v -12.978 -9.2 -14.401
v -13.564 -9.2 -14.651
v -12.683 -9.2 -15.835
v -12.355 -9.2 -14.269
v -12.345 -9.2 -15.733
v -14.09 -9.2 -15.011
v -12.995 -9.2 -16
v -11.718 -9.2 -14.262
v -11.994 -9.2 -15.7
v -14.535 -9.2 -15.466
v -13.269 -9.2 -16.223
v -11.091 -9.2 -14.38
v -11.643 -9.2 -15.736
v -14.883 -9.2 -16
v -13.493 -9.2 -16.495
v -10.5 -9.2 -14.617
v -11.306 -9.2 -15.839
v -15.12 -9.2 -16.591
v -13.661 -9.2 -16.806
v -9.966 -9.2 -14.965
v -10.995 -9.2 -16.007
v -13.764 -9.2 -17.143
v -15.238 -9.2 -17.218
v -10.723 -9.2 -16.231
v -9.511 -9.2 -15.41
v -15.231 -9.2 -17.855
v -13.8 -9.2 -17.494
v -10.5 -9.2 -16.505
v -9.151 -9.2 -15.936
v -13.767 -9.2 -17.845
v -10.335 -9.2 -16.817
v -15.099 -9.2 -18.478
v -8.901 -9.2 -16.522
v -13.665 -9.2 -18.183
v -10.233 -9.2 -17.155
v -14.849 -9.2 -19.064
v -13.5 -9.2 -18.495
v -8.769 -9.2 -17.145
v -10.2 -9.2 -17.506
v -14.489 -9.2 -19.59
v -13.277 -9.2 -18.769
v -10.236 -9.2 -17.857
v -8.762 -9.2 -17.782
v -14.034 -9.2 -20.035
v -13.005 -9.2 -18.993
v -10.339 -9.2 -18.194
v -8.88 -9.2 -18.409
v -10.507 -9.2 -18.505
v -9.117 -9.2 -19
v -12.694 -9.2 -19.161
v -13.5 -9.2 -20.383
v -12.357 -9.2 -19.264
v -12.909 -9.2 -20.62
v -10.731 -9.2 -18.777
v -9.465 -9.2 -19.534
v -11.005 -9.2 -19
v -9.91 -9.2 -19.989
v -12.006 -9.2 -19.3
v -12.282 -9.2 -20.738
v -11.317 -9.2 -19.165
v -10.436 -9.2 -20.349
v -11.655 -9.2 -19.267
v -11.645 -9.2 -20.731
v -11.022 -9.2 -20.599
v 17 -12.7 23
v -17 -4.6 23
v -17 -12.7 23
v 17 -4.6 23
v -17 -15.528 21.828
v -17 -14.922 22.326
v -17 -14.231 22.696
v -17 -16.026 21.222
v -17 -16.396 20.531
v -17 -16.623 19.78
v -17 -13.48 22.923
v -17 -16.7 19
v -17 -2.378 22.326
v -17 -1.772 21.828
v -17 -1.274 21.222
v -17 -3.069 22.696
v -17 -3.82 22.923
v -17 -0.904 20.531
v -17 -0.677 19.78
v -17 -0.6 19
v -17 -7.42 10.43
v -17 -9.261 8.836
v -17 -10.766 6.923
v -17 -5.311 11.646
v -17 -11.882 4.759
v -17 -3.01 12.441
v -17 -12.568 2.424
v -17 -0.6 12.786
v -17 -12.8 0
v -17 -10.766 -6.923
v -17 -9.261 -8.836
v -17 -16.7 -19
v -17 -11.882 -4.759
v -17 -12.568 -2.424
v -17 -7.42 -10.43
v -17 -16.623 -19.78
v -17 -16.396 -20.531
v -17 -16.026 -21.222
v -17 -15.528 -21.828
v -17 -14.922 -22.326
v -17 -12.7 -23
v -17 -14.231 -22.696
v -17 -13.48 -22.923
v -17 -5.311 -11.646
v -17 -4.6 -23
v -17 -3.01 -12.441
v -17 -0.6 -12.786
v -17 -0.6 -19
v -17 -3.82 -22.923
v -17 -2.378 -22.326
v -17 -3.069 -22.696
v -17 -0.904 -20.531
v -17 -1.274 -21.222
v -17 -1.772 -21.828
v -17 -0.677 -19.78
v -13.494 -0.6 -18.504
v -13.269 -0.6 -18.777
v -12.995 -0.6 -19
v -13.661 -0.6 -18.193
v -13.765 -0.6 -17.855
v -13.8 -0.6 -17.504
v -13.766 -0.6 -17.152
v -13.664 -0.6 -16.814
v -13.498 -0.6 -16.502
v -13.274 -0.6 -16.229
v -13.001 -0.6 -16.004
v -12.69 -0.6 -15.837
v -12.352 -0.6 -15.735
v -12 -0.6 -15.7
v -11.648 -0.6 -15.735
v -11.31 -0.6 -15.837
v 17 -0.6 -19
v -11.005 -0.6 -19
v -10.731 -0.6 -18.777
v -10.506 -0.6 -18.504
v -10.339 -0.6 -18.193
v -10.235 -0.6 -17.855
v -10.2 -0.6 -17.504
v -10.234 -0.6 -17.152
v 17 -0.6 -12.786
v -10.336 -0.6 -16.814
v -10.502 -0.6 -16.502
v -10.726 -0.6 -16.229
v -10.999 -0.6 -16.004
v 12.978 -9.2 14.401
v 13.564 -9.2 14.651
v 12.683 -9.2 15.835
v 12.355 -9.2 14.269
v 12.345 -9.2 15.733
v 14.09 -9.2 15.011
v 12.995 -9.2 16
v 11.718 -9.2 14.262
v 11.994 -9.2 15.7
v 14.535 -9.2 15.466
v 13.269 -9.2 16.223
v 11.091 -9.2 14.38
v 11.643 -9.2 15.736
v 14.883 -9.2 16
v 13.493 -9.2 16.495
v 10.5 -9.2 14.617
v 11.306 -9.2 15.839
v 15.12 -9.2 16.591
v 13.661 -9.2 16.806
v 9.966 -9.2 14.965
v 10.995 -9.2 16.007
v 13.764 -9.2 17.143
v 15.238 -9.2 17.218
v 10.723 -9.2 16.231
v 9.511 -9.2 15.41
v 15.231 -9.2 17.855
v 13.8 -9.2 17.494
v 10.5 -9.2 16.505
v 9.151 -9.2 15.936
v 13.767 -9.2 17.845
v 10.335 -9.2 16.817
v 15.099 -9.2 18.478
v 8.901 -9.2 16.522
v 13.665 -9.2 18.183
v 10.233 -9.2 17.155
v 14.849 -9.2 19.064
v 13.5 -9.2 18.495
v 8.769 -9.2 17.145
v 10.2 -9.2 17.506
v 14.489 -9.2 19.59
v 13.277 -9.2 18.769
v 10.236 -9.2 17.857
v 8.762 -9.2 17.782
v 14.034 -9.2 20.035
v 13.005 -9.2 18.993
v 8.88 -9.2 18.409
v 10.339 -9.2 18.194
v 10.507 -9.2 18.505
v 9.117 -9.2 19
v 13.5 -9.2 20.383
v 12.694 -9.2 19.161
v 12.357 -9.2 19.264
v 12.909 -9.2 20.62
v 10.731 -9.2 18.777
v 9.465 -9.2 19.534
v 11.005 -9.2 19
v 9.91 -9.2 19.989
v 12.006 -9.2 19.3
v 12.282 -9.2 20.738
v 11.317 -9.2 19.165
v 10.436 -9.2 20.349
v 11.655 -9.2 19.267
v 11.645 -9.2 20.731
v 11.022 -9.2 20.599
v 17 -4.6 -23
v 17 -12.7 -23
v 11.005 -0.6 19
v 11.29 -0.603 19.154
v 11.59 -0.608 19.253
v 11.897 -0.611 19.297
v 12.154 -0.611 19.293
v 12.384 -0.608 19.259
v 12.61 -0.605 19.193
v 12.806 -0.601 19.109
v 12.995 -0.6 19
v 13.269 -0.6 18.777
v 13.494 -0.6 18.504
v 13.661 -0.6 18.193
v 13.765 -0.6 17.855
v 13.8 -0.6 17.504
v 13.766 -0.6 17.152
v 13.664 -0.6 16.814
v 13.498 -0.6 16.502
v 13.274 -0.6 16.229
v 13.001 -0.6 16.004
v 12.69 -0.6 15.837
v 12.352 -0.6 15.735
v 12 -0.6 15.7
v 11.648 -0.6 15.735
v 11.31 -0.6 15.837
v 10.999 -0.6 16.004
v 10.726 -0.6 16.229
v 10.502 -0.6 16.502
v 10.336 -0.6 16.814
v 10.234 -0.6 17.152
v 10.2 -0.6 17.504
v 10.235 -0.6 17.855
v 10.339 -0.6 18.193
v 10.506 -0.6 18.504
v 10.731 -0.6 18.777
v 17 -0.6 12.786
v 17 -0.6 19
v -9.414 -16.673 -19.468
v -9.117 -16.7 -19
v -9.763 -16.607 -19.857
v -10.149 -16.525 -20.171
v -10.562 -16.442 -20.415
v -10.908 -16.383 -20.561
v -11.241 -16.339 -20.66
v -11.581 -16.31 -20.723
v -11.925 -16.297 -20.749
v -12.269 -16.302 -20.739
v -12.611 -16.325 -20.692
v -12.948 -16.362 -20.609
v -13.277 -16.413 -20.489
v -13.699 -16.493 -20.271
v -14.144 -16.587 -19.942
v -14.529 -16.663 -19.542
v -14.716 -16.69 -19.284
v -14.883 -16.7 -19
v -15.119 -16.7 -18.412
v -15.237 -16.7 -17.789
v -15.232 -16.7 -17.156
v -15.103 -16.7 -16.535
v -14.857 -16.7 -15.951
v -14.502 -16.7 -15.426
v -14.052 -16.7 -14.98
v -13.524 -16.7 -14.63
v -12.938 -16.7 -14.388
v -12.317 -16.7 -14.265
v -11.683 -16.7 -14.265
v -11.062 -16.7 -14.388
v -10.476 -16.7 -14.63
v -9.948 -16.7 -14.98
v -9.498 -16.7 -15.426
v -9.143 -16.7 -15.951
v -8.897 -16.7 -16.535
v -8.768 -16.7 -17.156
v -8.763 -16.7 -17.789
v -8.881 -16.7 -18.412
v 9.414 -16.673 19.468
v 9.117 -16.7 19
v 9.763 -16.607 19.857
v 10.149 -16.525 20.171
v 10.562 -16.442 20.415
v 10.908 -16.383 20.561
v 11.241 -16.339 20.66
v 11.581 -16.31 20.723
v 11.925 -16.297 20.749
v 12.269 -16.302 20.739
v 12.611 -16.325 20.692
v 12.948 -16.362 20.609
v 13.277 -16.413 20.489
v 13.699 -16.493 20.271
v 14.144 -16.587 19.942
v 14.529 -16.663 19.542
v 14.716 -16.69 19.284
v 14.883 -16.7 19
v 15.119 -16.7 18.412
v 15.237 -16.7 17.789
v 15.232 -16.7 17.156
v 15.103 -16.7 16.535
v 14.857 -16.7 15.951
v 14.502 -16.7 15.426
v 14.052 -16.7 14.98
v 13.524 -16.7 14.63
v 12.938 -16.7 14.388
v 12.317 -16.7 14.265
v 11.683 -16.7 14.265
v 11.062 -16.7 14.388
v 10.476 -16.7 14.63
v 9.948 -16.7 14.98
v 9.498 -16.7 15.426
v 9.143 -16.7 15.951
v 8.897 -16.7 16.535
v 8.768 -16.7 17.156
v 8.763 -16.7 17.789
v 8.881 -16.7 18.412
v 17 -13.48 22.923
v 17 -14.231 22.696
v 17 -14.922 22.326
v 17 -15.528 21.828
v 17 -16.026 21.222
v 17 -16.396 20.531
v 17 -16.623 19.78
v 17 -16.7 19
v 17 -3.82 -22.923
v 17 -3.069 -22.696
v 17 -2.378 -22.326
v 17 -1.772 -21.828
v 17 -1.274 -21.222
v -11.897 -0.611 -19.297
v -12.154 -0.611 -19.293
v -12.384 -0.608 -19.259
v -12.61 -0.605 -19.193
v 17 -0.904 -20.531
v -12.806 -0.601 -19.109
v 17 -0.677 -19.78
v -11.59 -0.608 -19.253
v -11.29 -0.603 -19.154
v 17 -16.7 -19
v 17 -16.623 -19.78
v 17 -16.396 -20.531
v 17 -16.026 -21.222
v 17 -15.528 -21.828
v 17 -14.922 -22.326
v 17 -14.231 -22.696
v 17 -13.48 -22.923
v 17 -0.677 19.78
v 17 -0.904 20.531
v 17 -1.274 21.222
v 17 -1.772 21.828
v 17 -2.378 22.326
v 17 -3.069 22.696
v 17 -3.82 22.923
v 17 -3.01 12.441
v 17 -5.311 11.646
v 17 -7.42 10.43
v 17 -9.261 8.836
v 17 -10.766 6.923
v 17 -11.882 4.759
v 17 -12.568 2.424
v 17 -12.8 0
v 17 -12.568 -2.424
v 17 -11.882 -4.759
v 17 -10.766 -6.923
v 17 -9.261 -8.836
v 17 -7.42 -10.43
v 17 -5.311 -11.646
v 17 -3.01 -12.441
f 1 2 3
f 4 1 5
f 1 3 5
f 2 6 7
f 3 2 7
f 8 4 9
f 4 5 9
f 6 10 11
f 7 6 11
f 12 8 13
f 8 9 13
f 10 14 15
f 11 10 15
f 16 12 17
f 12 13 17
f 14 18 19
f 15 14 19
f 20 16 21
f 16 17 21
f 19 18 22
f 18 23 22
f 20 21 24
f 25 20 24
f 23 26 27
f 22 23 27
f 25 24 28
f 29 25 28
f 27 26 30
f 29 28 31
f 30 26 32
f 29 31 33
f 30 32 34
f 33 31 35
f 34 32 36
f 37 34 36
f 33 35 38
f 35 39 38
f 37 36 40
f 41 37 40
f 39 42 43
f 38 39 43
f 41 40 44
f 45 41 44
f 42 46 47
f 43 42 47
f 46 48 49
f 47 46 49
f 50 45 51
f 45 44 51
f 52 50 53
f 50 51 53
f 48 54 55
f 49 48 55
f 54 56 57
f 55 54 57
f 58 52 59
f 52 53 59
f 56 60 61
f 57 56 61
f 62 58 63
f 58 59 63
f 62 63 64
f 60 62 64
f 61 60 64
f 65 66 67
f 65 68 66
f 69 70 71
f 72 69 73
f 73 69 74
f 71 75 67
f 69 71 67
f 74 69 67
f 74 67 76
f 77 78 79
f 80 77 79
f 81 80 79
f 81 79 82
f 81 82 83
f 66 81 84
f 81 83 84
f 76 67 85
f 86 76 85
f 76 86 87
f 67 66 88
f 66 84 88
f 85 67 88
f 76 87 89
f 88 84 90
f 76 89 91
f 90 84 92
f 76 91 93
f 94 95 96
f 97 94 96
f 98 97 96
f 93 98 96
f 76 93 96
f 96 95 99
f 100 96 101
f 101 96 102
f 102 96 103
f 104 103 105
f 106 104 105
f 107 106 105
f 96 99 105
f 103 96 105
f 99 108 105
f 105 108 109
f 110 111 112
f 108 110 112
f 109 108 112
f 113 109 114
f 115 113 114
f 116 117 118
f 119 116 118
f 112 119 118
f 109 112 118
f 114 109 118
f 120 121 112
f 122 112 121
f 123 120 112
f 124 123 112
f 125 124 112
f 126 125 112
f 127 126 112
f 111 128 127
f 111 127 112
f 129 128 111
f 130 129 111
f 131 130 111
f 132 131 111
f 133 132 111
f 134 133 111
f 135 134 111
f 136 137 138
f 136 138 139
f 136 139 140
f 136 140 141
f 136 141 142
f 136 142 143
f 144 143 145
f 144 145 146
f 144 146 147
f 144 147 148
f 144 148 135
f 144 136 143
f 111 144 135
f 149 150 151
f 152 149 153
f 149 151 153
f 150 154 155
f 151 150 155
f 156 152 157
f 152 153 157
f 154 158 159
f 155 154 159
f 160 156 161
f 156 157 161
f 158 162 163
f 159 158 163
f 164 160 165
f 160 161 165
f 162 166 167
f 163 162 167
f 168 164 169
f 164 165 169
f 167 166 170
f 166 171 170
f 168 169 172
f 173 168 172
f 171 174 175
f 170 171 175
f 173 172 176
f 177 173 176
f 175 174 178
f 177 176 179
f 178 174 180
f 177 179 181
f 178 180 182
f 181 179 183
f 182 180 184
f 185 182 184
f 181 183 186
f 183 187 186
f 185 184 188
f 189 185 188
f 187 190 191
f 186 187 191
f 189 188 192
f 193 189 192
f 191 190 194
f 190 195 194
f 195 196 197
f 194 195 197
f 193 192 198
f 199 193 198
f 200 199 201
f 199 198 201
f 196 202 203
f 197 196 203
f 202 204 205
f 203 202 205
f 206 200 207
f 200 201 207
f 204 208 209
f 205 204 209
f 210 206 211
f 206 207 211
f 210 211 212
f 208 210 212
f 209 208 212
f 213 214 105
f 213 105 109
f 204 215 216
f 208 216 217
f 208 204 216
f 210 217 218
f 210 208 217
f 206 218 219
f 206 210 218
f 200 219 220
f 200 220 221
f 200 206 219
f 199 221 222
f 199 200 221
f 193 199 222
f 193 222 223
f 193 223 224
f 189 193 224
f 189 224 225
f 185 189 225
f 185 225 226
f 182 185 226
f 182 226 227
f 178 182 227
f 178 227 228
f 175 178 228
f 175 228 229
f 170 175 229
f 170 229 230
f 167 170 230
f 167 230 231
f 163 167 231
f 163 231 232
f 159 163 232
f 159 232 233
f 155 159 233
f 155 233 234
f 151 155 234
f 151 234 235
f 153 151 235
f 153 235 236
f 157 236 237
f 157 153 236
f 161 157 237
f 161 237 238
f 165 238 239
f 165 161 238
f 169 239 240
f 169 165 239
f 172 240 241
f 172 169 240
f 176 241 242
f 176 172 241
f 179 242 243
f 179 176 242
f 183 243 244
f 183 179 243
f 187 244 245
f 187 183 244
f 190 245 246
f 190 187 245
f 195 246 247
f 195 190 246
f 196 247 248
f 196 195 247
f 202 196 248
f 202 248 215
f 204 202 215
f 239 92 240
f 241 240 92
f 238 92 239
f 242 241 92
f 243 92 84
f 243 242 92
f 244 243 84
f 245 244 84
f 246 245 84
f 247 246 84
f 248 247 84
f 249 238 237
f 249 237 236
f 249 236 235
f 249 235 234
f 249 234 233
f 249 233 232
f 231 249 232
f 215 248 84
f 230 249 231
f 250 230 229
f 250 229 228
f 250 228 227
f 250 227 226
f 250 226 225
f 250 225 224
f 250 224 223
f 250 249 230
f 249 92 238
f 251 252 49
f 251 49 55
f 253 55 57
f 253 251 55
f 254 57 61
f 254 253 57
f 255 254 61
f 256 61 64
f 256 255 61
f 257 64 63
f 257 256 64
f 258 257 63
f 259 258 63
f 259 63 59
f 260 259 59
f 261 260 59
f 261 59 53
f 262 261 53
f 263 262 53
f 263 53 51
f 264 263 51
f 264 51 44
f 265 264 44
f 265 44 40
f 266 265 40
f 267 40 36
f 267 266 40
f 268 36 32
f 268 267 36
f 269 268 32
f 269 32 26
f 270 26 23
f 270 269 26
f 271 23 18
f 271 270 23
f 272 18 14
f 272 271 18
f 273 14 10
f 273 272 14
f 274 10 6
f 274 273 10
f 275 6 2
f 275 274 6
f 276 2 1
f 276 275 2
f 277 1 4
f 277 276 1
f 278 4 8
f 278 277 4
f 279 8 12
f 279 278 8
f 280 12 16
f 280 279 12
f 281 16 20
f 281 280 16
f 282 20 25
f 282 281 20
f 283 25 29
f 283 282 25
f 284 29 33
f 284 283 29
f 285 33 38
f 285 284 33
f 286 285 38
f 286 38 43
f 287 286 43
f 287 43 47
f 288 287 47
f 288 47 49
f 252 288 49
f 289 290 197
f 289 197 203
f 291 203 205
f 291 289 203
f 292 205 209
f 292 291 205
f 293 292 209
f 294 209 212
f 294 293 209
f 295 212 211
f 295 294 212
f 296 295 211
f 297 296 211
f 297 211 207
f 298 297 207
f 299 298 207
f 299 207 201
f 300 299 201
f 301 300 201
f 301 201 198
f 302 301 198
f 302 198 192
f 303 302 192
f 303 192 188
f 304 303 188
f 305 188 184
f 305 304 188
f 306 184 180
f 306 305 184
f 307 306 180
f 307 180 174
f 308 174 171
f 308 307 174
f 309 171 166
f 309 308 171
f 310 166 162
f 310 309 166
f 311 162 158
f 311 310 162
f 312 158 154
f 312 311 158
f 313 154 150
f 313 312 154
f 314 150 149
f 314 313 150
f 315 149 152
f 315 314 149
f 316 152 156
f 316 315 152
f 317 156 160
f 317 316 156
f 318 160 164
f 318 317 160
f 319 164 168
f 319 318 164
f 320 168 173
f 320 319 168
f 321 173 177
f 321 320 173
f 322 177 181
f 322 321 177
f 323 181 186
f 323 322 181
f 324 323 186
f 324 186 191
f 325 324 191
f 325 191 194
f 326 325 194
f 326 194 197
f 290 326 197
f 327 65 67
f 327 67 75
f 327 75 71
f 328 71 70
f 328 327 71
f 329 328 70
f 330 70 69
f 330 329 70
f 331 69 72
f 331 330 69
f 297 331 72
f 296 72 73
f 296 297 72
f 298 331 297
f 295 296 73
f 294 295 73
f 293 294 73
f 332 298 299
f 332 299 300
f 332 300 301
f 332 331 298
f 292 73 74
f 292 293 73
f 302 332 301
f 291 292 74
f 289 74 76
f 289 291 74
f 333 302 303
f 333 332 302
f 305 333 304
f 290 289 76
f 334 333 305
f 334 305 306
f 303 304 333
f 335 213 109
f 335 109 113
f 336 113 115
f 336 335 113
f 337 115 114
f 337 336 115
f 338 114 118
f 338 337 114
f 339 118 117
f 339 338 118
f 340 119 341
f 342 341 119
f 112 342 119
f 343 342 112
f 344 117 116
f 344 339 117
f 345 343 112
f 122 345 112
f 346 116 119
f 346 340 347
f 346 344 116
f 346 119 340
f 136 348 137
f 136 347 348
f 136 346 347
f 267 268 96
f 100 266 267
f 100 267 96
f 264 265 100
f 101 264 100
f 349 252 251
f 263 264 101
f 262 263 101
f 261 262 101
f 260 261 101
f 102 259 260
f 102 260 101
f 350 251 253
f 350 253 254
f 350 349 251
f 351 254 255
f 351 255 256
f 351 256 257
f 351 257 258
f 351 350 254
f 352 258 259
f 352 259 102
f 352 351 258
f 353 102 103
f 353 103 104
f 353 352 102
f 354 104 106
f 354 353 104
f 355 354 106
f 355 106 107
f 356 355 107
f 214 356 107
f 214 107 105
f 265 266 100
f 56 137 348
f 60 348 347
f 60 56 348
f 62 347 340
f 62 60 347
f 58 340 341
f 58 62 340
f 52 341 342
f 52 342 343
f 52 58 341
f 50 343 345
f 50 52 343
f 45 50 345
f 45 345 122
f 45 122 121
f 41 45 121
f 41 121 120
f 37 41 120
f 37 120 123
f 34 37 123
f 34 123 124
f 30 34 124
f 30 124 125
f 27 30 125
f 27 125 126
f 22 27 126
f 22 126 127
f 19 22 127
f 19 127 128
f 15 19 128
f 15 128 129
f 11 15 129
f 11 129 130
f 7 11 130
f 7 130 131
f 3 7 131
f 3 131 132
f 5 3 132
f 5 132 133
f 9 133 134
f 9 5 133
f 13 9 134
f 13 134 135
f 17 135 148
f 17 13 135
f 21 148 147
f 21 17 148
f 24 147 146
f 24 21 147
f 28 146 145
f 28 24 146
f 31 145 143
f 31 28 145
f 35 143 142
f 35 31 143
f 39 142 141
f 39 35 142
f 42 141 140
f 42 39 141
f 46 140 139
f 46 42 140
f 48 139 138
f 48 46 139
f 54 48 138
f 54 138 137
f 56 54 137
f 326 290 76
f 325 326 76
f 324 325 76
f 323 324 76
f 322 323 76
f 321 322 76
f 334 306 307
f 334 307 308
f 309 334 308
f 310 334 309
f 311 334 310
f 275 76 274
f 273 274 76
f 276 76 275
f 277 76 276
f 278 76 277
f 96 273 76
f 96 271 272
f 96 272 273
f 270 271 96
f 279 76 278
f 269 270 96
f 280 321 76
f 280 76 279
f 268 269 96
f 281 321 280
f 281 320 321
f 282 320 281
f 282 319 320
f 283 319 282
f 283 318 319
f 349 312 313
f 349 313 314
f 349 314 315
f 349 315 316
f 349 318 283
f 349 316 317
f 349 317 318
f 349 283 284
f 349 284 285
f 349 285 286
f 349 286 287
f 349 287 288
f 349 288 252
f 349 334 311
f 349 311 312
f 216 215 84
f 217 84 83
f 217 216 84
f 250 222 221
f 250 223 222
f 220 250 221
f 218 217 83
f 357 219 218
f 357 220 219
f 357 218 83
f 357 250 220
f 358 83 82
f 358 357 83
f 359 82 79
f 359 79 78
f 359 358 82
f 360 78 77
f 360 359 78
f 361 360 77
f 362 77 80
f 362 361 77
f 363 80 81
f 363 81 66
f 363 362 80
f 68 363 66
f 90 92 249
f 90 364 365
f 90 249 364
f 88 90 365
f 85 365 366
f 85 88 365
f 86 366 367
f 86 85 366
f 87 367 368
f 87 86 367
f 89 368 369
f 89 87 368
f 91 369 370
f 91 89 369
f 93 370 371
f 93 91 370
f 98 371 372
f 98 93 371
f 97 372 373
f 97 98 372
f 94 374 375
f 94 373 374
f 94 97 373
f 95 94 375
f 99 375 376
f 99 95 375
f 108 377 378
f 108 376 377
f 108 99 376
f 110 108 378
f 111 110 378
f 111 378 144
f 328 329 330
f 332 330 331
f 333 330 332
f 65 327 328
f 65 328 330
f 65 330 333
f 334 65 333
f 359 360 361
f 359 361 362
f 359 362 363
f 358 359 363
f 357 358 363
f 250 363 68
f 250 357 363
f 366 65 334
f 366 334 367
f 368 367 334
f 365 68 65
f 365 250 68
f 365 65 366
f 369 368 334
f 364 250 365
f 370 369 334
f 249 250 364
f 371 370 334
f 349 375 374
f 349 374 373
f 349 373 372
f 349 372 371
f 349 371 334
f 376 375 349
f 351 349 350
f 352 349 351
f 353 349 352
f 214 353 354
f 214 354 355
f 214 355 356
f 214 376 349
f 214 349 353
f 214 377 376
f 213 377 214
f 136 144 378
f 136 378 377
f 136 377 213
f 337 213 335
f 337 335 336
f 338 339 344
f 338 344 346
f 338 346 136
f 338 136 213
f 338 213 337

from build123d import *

# Parameters (mm, degrees)
BOSS_EXTRUDE1_DEPTH     = 17
CUT_EXTRUDE1_DEPTH      = 34.119329703
CUT_EXTRUDE1_DEPTH_BACK = 34.119329703
SKETCH2_R               = 12.8
SKETCH3_R               = 1.8
CUT_EXTRUDE2_DEPTH      = 17
SKETCH4_R               = 3.25
CUT_EXTRUDE3_DEPTH      = 7.5


with BuildPart() as part:
    # Sketch1 → Boss-Extrude1 (new, symmetric)
    with BuildSketch(Plane(origin=(0, 0, 0), x_dir=(0, 0, -1), z_dir=(1, 0, 0))):
        with BuildLine():
            Line((-19, -16.7), (19, -16.7))
            ThreePointArc((19, -16.7), (21.828427125, -15.528427125), (23, -12.7))
            Line((23, -12.7), (23, -4.6))
            ThreePointArc((23, -4.6), (21.828427125, -1.771572875), (19, -0.6))
            Line((19, -0.6), (-19, -0.6))
            ThreePointArc((-19, -0.6), (-21.828427125, -1.771572875), (-23, -4.6))
            Line((-23, -4.6), (-23, -12.7))
            ThreePointArc((-23, -12.7), (-21.828427125, -15.528427125), (-19, -16.7))
        make_face()
    extrude(amount=BOSS_EXTRUDE1_DEPTH, both=True)

    # Sketch2 → Cut-Extrude1 (cut, two sides: drawn at the far end of the back side and taken through both)
    with BuildSketch(Plane(origin=(0, 0, 0), x_dir=(0, 0, -1), z_dir=(1, 0, 0)).offset(-CUT_EXTRUDE1_DEPTH_BACK)):
        Circle(SKETCH2_R)
    extrude(amount=CUT_EXTRUDE1_DEPTH + CUT_EXTRUDE1_DEPTH_BACK, mode=Mode.SUBTRACT)

    # Sketch3 → Cut-Extrude2 (cut)
    with BuildSketch(Plane(origin=(0, -16.7, 0), x_dir=(1, 0, 0), z_dir=(0, 1, 0))):
        with Locations(Location((12, -17.5, 0), (0, 0, 236.442690238))):
            Circle(SKETCH3_R)
        with Locations(Location((-12, 17.5, 0), (0, 0, 56.442690238))):
            Circle(SKETCH3_R)
    extrude(amount=CUT_EXTRUDE2_DEPTH, mode=Mode.SUBTRACT)

    # Sketch4 → Cut-Extrude3 (cut)
    with BuildSketch(Plane(origin=(0, -16.7, 0), x_dir=(1, 0, 0), z_dir=(0, 1, 0))):
        with Locations(Location((12, -17.5, 0), (0, 0, 207.48642625))):
            Circle(SKETCH4_R)
        with Locations(Location((-12, 17.5, 0), (0, 0, 27.48642625))):
            Circle(SKETCH4_R)
    extrude(amount=CUT_EXTRUDE3_DEPTH, mode=Mode.SUBTRACT)


solid = part.part
